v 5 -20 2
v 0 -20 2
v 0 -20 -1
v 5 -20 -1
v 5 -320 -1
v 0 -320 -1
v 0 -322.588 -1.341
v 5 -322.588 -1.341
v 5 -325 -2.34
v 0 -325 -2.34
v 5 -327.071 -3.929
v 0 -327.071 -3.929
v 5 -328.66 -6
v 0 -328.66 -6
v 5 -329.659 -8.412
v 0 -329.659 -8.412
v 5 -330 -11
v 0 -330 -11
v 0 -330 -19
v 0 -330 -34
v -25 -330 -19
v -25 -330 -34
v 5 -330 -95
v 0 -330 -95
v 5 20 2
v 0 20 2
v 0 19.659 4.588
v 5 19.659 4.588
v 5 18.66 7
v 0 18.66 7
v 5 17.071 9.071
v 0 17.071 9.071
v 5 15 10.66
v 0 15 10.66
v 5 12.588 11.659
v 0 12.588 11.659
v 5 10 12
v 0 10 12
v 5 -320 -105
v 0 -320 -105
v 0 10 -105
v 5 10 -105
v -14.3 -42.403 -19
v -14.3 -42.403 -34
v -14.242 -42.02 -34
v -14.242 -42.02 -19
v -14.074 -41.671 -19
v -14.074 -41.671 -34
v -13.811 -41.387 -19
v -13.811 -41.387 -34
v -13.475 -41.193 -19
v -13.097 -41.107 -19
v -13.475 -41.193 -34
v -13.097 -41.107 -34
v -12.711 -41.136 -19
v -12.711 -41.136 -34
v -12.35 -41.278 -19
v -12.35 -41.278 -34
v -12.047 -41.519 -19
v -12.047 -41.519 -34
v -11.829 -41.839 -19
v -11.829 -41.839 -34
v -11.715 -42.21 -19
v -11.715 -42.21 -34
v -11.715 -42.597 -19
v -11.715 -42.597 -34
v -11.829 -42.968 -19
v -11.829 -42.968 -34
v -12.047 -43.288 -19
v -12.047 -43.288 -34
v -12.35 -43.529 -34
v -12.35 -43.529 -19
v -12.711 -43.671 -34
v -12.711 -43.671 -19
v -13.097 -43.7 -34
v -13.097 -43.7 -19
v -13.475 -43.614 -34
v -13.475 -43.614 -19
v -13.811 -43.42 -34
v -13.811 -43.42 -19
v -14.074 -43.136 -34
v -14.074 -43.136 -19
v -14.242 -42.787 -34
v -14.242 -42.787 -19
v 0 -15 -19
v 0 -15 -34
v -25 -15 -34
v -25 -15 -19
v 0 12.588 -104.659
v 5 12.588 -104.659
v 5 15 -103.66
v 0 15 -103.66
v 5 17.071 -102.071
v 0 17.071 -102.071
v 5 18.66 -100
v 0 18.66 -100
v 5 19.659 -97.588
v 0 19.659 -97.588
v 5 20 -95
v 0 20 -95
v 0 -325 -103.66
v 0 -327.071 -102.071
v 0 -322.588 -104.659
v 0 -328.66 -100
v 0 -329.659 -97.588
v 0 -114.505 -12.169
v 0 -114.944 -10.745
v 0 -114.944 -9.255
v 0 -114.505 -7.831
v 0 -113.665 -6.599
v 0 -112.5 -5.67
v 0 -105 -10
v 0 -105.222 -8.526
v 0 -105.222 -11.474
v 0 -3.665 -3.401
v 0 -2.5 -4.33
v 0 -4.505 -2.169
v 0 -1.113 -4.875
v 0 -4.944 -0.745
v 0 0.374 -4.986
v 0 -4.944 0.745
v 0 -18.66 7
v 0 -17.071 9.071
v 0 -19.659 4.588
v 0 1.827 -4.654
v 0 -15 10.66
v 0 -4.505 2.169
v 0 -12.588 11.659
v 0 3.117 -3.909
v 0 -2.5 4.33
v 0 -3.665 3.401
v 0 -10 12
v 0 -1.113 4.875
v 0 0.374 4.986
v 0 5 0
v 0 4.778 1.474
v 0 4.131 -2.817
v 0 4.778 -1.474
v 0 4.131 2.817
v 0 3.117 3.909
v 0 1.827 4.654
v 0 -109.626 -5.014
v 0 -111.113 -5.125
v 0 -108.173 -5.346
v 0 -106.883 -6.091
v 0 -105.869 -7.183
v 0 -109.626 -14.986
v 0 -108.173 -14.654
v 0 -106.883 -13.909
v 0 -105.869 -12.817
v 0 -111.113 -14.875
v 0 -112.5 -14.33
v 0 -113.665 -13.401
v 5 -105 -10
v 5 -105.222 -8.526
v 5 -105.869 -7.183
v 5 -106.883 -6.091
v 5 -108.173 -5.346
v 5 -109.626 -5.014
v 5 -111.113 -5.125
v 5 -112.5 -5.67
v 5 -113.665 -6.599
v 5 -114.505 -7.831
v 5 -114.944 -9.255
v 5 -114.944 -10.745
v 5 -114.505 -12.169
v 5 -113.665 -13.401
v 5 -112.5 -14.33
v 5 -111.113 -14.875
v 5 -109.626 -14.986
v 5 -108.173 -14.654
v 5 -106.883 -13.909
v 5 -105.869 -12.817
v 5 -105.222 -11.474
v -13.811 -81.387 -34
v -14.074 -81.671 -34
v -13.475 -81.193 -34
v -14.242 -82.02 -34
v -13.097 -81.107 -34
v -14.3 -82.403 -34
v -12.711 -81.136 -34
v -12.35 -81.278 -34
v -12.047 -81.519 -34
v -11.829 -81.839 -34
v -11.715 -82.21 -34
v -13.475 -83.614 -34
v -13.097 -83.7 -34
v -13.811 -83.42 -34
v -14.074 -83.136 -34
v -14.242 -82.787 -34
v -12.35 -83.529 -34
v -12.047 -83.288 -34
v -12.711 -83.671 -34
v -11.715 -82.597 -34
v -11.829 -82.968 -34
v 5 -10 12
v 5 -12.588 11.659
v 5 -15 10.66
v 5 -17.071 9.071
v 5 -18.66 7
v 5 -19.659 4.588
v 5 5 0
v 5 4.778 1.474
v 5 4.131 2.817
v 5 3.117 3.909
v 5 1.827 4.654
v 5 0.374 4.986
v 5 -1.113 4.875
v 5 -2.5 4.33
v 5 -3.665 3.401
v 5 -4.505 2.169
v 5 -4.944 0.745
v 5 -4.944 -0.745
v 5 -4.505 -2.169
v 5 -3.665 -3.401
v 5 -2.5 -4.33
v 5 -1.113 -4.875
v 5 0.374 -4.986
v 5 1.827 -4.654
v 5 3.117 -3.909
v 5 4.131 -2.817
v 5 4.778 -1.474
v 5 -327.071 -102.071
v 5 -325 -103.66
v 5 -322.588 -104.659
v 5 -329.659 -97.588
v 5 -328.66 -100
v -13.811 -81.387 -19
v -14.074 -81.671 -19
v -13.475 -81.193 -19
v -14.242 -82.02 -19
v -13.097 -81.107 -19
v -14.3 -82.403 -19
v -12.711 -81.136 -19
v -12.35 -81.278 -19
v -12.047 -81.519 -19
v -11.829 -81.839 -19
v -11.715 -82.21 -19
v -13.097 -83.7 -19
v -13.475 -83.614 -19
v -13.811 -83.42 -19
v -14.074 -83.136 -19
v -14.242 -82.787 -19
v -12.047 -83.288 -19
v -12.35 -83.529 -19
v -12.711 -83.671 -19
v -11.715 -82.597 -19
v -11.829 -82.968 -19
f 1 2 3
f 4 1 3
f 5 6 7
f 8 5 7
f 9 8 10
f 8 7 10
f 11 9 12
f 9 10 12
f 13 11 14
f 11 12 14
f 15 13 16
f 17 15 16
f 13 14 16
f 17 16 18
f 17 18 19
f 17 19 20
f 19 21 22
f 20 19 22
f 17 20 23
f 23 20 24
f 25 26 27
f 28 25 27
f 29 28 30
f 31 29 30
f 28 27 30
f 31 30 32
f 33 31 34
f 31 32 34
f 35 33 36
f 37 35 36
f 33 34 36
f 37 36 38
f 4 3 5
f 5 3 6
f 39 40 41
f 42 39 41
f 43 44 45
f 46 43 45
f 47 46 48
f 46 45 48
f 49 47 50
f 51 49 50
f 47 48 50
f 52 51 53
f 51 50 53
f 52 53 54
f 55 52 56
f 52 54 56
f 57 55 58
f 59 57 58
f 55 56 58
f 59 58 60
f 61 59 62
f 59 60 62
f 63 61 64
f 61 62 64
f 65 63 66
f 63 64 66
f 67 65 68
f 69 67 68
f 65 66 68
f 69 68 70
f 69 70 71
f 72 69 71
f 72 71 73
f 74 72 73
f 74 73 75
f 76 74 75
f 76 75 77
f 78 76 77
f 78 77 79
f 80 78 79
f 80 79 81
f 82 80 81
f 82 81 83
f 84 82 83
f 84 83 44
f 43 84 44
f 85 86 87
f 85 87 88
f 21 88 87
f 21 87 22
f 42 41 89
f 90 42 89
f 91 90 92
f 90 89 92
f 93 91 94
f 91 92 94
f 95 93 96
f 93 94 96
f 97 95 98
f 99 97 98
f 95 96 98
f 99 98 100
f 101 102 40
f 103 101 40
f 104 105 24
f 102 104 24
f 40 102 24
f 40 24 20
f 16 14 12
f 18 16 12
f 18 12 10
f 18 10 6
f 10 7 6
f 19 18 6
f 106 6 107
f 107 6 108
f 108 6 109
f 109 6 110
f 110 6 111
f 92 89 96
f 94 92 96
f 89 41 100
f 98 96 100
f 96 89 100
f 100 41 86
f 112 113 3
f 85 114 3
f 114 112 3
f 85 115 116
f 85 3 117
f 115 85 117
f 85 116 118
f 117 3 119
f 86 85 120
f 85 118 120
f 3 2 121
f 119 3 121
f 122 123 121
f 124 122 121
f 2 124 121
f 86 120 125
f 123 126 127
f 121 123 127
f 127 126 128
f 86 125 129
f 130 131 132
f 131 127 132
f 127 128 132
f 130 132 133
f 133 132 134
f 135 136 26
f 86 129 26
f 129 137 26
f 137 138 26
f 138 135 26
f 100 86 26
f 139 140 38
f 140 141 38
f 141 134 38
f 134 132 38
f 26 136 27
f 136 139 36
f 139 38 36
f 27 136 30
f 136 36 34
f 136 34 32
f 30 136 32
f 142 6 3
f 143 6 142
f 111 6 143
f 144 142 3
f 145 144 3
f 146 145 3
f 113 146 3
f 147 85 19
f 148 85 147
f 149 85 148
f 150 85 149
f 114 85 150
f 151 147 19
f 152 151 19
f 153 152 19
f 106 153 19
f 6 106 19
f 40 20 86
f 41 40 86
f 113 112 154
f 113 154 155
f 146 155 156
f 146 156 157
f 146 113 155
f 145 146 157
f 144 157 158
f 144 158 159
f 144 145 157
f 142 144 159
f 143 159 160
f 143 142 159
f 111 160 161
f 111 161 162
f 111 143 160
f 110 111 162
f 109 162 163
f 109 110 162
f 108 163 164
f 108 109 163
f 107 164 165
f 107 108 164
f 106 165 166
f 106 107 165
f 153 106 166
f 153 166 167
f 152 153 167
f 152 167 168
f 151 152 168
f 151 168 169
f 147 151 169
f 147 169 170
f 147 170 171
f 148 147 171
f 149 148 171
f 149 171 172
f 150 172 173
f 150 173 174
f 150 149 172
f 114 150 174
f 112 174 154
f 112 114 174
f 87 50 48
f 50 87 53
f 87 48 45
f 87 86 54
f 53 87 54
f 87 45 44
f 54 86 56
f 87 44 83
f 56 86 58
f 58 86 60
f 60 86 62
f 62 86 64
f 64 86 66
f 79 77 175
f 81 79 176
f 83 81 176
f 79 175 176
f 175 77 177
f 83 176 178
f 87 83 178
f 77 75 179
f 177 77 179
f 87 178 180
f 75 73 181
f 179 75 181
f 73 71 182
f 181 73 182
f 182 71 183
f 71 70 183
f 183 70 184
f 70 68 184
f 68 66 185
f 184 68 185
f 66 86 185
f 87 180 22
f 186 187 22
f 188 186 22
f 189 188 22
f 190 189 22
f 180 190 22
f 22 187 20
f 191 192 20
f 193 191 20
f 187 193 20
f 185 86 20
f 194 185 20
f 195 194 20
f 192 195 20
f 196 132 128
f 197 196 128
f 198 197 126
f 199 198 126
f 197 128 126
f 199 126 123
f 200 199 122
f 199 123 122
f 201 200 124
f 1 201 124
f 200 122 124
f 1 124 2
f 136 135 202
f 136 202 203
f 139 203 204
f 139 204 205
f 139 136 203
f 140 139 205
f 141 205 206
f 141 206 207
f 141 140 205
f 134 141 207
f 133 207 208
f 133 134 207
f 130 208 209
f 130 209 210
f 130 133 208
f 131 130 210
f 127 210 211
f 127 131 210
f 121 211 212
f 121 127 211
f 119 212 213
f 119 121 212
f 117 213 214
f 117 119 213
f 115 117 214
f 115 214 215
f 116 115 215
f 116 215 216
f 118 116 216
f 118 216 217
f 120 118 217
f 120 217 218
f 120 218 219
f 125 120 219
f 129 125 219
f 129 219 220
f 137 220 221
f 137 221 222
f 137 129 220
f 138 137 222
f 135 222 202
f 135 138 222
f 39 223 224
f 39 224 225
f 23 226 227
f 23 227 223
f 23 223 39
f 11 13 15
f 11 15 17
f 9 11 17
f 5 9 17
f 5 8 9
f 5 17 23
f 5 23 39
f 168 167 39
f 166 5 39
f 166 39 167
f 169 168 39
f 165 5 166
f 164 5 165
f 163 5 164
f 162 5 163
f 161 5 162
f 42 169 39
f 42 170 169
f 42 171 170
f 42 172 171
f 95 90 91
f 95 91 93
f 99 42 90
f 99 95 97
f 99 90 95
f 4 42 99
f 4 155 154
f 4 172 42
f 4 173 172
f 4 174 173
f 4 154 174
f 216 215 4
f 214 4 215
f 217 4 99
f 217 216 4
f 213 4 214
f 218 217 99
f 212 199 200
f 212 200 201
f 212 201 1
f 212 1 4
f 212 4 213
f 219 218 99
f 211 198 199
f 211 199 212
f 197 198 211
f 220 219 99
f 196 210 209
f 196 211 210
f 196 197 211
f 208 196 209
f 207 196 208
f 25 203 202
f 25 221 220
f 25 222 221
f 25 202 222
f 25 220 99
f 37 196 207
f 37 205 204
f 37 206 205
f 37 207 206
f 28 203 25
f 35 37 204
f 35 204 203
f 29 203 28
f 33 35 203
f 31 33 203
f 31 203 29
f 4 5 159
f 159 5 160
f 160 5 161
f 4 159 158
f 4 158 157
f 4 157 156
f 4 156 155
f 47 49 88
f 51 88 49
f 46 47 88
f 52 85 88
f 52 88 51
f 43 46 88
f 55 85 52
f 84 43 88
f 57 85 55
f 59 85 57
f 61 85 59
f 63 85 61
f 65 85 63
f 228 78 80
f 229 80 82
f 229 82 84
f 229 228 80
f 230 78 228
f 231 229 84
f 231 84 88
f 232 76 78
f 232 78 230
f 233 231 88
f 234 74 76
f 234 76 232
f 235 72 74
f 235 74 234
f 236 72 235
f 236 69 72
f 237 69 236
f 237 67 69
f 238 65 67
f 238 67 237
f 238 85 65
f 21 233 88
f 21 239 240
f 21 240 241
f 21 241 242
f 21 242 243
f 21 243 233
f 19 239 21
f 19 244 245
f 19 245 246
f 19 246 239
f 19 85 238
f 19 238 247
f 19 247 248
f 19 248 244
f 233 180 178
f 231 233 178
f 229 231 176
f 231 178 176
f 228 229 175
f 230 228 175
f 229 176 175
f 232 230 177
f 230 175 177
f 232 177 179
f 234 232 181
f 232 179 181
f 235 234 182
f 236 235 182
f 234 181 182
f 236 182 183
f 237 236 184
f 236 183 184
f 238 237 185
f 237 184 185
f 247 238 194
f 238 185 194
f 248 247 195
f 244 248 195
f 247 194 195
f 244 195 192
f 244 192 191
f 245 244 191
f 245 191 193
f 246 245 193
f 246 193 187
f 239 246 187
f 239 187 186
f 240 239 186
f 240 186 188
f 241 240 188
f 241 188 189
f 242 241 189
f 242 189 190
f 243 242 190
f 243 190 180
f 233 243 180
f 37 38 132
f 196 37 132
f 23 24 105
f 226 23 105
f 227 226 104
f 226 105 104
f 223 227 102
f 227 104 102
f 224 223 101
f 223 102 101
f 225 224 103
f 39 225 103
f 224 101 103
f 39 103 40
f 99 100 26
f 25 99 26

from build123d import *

# Parameters (mm, degrees)
F0_R     = 5
F1_DEPTH = 5
F2_W     = 315
F2_H     = 15
F3_DEPTH = 25
F5_D     = 2.6


with BuildPart() as f1:
    # F0 (on Right) → F1 (new body)
    with BuildSketch(Plane.YZ):
        with BuildLine():
            Line((-20, -1), (-320, -1))
            ThreePointArc((-320, -1), (-327.071068, -3.928932), (-330, -11))
            Line((-330, -11), (-330, -95))
            ThreePointArc((-330, -95), (-327.071068, -102.071068), (-320, -105))
            Line((-320, -105), (10, -105))
            ThreePointArc((10, -105), (17.071068, -102.071068), (20, -95))
            Line((20, -95), (20, 2))
            ThreePointArc((20, 2), (17.071068, 9.071068), (10, 12))
            Line((10, 12), (-10, 12))
            ThreePointArc((-10, 12), (-17.071068, 9.071068), (-20, 2))
            Line((-20, 2), (-20, -1))
        make_face()
        with Locations((-110, -10)):
            Circle(F0_R, mode=Mode.SUBTRACT)
        Circle(F0_R, mode=Mode.SUBTRACT)
    extrude(amount=F1_DEPTH)

    # F2 (on face) → F3 (join)
    with BuildSketch(Plane(origin=(0, 0, 0), x_dir=(0, -1, 0), z_dir=(-1, 0, 0))):
        with Locations((172.5, -26.5)):
            Rectangle(F2_W, F2_H)
    extrude(amount=F3_DEPTH)

    # F5 (through all)
    with Locations(Plane.XY.offset(-19)):
        with Locations((-13, -42.403466), (-13, -82.403466)):
            Hole(F5_D / 2)


solid = f1.part
